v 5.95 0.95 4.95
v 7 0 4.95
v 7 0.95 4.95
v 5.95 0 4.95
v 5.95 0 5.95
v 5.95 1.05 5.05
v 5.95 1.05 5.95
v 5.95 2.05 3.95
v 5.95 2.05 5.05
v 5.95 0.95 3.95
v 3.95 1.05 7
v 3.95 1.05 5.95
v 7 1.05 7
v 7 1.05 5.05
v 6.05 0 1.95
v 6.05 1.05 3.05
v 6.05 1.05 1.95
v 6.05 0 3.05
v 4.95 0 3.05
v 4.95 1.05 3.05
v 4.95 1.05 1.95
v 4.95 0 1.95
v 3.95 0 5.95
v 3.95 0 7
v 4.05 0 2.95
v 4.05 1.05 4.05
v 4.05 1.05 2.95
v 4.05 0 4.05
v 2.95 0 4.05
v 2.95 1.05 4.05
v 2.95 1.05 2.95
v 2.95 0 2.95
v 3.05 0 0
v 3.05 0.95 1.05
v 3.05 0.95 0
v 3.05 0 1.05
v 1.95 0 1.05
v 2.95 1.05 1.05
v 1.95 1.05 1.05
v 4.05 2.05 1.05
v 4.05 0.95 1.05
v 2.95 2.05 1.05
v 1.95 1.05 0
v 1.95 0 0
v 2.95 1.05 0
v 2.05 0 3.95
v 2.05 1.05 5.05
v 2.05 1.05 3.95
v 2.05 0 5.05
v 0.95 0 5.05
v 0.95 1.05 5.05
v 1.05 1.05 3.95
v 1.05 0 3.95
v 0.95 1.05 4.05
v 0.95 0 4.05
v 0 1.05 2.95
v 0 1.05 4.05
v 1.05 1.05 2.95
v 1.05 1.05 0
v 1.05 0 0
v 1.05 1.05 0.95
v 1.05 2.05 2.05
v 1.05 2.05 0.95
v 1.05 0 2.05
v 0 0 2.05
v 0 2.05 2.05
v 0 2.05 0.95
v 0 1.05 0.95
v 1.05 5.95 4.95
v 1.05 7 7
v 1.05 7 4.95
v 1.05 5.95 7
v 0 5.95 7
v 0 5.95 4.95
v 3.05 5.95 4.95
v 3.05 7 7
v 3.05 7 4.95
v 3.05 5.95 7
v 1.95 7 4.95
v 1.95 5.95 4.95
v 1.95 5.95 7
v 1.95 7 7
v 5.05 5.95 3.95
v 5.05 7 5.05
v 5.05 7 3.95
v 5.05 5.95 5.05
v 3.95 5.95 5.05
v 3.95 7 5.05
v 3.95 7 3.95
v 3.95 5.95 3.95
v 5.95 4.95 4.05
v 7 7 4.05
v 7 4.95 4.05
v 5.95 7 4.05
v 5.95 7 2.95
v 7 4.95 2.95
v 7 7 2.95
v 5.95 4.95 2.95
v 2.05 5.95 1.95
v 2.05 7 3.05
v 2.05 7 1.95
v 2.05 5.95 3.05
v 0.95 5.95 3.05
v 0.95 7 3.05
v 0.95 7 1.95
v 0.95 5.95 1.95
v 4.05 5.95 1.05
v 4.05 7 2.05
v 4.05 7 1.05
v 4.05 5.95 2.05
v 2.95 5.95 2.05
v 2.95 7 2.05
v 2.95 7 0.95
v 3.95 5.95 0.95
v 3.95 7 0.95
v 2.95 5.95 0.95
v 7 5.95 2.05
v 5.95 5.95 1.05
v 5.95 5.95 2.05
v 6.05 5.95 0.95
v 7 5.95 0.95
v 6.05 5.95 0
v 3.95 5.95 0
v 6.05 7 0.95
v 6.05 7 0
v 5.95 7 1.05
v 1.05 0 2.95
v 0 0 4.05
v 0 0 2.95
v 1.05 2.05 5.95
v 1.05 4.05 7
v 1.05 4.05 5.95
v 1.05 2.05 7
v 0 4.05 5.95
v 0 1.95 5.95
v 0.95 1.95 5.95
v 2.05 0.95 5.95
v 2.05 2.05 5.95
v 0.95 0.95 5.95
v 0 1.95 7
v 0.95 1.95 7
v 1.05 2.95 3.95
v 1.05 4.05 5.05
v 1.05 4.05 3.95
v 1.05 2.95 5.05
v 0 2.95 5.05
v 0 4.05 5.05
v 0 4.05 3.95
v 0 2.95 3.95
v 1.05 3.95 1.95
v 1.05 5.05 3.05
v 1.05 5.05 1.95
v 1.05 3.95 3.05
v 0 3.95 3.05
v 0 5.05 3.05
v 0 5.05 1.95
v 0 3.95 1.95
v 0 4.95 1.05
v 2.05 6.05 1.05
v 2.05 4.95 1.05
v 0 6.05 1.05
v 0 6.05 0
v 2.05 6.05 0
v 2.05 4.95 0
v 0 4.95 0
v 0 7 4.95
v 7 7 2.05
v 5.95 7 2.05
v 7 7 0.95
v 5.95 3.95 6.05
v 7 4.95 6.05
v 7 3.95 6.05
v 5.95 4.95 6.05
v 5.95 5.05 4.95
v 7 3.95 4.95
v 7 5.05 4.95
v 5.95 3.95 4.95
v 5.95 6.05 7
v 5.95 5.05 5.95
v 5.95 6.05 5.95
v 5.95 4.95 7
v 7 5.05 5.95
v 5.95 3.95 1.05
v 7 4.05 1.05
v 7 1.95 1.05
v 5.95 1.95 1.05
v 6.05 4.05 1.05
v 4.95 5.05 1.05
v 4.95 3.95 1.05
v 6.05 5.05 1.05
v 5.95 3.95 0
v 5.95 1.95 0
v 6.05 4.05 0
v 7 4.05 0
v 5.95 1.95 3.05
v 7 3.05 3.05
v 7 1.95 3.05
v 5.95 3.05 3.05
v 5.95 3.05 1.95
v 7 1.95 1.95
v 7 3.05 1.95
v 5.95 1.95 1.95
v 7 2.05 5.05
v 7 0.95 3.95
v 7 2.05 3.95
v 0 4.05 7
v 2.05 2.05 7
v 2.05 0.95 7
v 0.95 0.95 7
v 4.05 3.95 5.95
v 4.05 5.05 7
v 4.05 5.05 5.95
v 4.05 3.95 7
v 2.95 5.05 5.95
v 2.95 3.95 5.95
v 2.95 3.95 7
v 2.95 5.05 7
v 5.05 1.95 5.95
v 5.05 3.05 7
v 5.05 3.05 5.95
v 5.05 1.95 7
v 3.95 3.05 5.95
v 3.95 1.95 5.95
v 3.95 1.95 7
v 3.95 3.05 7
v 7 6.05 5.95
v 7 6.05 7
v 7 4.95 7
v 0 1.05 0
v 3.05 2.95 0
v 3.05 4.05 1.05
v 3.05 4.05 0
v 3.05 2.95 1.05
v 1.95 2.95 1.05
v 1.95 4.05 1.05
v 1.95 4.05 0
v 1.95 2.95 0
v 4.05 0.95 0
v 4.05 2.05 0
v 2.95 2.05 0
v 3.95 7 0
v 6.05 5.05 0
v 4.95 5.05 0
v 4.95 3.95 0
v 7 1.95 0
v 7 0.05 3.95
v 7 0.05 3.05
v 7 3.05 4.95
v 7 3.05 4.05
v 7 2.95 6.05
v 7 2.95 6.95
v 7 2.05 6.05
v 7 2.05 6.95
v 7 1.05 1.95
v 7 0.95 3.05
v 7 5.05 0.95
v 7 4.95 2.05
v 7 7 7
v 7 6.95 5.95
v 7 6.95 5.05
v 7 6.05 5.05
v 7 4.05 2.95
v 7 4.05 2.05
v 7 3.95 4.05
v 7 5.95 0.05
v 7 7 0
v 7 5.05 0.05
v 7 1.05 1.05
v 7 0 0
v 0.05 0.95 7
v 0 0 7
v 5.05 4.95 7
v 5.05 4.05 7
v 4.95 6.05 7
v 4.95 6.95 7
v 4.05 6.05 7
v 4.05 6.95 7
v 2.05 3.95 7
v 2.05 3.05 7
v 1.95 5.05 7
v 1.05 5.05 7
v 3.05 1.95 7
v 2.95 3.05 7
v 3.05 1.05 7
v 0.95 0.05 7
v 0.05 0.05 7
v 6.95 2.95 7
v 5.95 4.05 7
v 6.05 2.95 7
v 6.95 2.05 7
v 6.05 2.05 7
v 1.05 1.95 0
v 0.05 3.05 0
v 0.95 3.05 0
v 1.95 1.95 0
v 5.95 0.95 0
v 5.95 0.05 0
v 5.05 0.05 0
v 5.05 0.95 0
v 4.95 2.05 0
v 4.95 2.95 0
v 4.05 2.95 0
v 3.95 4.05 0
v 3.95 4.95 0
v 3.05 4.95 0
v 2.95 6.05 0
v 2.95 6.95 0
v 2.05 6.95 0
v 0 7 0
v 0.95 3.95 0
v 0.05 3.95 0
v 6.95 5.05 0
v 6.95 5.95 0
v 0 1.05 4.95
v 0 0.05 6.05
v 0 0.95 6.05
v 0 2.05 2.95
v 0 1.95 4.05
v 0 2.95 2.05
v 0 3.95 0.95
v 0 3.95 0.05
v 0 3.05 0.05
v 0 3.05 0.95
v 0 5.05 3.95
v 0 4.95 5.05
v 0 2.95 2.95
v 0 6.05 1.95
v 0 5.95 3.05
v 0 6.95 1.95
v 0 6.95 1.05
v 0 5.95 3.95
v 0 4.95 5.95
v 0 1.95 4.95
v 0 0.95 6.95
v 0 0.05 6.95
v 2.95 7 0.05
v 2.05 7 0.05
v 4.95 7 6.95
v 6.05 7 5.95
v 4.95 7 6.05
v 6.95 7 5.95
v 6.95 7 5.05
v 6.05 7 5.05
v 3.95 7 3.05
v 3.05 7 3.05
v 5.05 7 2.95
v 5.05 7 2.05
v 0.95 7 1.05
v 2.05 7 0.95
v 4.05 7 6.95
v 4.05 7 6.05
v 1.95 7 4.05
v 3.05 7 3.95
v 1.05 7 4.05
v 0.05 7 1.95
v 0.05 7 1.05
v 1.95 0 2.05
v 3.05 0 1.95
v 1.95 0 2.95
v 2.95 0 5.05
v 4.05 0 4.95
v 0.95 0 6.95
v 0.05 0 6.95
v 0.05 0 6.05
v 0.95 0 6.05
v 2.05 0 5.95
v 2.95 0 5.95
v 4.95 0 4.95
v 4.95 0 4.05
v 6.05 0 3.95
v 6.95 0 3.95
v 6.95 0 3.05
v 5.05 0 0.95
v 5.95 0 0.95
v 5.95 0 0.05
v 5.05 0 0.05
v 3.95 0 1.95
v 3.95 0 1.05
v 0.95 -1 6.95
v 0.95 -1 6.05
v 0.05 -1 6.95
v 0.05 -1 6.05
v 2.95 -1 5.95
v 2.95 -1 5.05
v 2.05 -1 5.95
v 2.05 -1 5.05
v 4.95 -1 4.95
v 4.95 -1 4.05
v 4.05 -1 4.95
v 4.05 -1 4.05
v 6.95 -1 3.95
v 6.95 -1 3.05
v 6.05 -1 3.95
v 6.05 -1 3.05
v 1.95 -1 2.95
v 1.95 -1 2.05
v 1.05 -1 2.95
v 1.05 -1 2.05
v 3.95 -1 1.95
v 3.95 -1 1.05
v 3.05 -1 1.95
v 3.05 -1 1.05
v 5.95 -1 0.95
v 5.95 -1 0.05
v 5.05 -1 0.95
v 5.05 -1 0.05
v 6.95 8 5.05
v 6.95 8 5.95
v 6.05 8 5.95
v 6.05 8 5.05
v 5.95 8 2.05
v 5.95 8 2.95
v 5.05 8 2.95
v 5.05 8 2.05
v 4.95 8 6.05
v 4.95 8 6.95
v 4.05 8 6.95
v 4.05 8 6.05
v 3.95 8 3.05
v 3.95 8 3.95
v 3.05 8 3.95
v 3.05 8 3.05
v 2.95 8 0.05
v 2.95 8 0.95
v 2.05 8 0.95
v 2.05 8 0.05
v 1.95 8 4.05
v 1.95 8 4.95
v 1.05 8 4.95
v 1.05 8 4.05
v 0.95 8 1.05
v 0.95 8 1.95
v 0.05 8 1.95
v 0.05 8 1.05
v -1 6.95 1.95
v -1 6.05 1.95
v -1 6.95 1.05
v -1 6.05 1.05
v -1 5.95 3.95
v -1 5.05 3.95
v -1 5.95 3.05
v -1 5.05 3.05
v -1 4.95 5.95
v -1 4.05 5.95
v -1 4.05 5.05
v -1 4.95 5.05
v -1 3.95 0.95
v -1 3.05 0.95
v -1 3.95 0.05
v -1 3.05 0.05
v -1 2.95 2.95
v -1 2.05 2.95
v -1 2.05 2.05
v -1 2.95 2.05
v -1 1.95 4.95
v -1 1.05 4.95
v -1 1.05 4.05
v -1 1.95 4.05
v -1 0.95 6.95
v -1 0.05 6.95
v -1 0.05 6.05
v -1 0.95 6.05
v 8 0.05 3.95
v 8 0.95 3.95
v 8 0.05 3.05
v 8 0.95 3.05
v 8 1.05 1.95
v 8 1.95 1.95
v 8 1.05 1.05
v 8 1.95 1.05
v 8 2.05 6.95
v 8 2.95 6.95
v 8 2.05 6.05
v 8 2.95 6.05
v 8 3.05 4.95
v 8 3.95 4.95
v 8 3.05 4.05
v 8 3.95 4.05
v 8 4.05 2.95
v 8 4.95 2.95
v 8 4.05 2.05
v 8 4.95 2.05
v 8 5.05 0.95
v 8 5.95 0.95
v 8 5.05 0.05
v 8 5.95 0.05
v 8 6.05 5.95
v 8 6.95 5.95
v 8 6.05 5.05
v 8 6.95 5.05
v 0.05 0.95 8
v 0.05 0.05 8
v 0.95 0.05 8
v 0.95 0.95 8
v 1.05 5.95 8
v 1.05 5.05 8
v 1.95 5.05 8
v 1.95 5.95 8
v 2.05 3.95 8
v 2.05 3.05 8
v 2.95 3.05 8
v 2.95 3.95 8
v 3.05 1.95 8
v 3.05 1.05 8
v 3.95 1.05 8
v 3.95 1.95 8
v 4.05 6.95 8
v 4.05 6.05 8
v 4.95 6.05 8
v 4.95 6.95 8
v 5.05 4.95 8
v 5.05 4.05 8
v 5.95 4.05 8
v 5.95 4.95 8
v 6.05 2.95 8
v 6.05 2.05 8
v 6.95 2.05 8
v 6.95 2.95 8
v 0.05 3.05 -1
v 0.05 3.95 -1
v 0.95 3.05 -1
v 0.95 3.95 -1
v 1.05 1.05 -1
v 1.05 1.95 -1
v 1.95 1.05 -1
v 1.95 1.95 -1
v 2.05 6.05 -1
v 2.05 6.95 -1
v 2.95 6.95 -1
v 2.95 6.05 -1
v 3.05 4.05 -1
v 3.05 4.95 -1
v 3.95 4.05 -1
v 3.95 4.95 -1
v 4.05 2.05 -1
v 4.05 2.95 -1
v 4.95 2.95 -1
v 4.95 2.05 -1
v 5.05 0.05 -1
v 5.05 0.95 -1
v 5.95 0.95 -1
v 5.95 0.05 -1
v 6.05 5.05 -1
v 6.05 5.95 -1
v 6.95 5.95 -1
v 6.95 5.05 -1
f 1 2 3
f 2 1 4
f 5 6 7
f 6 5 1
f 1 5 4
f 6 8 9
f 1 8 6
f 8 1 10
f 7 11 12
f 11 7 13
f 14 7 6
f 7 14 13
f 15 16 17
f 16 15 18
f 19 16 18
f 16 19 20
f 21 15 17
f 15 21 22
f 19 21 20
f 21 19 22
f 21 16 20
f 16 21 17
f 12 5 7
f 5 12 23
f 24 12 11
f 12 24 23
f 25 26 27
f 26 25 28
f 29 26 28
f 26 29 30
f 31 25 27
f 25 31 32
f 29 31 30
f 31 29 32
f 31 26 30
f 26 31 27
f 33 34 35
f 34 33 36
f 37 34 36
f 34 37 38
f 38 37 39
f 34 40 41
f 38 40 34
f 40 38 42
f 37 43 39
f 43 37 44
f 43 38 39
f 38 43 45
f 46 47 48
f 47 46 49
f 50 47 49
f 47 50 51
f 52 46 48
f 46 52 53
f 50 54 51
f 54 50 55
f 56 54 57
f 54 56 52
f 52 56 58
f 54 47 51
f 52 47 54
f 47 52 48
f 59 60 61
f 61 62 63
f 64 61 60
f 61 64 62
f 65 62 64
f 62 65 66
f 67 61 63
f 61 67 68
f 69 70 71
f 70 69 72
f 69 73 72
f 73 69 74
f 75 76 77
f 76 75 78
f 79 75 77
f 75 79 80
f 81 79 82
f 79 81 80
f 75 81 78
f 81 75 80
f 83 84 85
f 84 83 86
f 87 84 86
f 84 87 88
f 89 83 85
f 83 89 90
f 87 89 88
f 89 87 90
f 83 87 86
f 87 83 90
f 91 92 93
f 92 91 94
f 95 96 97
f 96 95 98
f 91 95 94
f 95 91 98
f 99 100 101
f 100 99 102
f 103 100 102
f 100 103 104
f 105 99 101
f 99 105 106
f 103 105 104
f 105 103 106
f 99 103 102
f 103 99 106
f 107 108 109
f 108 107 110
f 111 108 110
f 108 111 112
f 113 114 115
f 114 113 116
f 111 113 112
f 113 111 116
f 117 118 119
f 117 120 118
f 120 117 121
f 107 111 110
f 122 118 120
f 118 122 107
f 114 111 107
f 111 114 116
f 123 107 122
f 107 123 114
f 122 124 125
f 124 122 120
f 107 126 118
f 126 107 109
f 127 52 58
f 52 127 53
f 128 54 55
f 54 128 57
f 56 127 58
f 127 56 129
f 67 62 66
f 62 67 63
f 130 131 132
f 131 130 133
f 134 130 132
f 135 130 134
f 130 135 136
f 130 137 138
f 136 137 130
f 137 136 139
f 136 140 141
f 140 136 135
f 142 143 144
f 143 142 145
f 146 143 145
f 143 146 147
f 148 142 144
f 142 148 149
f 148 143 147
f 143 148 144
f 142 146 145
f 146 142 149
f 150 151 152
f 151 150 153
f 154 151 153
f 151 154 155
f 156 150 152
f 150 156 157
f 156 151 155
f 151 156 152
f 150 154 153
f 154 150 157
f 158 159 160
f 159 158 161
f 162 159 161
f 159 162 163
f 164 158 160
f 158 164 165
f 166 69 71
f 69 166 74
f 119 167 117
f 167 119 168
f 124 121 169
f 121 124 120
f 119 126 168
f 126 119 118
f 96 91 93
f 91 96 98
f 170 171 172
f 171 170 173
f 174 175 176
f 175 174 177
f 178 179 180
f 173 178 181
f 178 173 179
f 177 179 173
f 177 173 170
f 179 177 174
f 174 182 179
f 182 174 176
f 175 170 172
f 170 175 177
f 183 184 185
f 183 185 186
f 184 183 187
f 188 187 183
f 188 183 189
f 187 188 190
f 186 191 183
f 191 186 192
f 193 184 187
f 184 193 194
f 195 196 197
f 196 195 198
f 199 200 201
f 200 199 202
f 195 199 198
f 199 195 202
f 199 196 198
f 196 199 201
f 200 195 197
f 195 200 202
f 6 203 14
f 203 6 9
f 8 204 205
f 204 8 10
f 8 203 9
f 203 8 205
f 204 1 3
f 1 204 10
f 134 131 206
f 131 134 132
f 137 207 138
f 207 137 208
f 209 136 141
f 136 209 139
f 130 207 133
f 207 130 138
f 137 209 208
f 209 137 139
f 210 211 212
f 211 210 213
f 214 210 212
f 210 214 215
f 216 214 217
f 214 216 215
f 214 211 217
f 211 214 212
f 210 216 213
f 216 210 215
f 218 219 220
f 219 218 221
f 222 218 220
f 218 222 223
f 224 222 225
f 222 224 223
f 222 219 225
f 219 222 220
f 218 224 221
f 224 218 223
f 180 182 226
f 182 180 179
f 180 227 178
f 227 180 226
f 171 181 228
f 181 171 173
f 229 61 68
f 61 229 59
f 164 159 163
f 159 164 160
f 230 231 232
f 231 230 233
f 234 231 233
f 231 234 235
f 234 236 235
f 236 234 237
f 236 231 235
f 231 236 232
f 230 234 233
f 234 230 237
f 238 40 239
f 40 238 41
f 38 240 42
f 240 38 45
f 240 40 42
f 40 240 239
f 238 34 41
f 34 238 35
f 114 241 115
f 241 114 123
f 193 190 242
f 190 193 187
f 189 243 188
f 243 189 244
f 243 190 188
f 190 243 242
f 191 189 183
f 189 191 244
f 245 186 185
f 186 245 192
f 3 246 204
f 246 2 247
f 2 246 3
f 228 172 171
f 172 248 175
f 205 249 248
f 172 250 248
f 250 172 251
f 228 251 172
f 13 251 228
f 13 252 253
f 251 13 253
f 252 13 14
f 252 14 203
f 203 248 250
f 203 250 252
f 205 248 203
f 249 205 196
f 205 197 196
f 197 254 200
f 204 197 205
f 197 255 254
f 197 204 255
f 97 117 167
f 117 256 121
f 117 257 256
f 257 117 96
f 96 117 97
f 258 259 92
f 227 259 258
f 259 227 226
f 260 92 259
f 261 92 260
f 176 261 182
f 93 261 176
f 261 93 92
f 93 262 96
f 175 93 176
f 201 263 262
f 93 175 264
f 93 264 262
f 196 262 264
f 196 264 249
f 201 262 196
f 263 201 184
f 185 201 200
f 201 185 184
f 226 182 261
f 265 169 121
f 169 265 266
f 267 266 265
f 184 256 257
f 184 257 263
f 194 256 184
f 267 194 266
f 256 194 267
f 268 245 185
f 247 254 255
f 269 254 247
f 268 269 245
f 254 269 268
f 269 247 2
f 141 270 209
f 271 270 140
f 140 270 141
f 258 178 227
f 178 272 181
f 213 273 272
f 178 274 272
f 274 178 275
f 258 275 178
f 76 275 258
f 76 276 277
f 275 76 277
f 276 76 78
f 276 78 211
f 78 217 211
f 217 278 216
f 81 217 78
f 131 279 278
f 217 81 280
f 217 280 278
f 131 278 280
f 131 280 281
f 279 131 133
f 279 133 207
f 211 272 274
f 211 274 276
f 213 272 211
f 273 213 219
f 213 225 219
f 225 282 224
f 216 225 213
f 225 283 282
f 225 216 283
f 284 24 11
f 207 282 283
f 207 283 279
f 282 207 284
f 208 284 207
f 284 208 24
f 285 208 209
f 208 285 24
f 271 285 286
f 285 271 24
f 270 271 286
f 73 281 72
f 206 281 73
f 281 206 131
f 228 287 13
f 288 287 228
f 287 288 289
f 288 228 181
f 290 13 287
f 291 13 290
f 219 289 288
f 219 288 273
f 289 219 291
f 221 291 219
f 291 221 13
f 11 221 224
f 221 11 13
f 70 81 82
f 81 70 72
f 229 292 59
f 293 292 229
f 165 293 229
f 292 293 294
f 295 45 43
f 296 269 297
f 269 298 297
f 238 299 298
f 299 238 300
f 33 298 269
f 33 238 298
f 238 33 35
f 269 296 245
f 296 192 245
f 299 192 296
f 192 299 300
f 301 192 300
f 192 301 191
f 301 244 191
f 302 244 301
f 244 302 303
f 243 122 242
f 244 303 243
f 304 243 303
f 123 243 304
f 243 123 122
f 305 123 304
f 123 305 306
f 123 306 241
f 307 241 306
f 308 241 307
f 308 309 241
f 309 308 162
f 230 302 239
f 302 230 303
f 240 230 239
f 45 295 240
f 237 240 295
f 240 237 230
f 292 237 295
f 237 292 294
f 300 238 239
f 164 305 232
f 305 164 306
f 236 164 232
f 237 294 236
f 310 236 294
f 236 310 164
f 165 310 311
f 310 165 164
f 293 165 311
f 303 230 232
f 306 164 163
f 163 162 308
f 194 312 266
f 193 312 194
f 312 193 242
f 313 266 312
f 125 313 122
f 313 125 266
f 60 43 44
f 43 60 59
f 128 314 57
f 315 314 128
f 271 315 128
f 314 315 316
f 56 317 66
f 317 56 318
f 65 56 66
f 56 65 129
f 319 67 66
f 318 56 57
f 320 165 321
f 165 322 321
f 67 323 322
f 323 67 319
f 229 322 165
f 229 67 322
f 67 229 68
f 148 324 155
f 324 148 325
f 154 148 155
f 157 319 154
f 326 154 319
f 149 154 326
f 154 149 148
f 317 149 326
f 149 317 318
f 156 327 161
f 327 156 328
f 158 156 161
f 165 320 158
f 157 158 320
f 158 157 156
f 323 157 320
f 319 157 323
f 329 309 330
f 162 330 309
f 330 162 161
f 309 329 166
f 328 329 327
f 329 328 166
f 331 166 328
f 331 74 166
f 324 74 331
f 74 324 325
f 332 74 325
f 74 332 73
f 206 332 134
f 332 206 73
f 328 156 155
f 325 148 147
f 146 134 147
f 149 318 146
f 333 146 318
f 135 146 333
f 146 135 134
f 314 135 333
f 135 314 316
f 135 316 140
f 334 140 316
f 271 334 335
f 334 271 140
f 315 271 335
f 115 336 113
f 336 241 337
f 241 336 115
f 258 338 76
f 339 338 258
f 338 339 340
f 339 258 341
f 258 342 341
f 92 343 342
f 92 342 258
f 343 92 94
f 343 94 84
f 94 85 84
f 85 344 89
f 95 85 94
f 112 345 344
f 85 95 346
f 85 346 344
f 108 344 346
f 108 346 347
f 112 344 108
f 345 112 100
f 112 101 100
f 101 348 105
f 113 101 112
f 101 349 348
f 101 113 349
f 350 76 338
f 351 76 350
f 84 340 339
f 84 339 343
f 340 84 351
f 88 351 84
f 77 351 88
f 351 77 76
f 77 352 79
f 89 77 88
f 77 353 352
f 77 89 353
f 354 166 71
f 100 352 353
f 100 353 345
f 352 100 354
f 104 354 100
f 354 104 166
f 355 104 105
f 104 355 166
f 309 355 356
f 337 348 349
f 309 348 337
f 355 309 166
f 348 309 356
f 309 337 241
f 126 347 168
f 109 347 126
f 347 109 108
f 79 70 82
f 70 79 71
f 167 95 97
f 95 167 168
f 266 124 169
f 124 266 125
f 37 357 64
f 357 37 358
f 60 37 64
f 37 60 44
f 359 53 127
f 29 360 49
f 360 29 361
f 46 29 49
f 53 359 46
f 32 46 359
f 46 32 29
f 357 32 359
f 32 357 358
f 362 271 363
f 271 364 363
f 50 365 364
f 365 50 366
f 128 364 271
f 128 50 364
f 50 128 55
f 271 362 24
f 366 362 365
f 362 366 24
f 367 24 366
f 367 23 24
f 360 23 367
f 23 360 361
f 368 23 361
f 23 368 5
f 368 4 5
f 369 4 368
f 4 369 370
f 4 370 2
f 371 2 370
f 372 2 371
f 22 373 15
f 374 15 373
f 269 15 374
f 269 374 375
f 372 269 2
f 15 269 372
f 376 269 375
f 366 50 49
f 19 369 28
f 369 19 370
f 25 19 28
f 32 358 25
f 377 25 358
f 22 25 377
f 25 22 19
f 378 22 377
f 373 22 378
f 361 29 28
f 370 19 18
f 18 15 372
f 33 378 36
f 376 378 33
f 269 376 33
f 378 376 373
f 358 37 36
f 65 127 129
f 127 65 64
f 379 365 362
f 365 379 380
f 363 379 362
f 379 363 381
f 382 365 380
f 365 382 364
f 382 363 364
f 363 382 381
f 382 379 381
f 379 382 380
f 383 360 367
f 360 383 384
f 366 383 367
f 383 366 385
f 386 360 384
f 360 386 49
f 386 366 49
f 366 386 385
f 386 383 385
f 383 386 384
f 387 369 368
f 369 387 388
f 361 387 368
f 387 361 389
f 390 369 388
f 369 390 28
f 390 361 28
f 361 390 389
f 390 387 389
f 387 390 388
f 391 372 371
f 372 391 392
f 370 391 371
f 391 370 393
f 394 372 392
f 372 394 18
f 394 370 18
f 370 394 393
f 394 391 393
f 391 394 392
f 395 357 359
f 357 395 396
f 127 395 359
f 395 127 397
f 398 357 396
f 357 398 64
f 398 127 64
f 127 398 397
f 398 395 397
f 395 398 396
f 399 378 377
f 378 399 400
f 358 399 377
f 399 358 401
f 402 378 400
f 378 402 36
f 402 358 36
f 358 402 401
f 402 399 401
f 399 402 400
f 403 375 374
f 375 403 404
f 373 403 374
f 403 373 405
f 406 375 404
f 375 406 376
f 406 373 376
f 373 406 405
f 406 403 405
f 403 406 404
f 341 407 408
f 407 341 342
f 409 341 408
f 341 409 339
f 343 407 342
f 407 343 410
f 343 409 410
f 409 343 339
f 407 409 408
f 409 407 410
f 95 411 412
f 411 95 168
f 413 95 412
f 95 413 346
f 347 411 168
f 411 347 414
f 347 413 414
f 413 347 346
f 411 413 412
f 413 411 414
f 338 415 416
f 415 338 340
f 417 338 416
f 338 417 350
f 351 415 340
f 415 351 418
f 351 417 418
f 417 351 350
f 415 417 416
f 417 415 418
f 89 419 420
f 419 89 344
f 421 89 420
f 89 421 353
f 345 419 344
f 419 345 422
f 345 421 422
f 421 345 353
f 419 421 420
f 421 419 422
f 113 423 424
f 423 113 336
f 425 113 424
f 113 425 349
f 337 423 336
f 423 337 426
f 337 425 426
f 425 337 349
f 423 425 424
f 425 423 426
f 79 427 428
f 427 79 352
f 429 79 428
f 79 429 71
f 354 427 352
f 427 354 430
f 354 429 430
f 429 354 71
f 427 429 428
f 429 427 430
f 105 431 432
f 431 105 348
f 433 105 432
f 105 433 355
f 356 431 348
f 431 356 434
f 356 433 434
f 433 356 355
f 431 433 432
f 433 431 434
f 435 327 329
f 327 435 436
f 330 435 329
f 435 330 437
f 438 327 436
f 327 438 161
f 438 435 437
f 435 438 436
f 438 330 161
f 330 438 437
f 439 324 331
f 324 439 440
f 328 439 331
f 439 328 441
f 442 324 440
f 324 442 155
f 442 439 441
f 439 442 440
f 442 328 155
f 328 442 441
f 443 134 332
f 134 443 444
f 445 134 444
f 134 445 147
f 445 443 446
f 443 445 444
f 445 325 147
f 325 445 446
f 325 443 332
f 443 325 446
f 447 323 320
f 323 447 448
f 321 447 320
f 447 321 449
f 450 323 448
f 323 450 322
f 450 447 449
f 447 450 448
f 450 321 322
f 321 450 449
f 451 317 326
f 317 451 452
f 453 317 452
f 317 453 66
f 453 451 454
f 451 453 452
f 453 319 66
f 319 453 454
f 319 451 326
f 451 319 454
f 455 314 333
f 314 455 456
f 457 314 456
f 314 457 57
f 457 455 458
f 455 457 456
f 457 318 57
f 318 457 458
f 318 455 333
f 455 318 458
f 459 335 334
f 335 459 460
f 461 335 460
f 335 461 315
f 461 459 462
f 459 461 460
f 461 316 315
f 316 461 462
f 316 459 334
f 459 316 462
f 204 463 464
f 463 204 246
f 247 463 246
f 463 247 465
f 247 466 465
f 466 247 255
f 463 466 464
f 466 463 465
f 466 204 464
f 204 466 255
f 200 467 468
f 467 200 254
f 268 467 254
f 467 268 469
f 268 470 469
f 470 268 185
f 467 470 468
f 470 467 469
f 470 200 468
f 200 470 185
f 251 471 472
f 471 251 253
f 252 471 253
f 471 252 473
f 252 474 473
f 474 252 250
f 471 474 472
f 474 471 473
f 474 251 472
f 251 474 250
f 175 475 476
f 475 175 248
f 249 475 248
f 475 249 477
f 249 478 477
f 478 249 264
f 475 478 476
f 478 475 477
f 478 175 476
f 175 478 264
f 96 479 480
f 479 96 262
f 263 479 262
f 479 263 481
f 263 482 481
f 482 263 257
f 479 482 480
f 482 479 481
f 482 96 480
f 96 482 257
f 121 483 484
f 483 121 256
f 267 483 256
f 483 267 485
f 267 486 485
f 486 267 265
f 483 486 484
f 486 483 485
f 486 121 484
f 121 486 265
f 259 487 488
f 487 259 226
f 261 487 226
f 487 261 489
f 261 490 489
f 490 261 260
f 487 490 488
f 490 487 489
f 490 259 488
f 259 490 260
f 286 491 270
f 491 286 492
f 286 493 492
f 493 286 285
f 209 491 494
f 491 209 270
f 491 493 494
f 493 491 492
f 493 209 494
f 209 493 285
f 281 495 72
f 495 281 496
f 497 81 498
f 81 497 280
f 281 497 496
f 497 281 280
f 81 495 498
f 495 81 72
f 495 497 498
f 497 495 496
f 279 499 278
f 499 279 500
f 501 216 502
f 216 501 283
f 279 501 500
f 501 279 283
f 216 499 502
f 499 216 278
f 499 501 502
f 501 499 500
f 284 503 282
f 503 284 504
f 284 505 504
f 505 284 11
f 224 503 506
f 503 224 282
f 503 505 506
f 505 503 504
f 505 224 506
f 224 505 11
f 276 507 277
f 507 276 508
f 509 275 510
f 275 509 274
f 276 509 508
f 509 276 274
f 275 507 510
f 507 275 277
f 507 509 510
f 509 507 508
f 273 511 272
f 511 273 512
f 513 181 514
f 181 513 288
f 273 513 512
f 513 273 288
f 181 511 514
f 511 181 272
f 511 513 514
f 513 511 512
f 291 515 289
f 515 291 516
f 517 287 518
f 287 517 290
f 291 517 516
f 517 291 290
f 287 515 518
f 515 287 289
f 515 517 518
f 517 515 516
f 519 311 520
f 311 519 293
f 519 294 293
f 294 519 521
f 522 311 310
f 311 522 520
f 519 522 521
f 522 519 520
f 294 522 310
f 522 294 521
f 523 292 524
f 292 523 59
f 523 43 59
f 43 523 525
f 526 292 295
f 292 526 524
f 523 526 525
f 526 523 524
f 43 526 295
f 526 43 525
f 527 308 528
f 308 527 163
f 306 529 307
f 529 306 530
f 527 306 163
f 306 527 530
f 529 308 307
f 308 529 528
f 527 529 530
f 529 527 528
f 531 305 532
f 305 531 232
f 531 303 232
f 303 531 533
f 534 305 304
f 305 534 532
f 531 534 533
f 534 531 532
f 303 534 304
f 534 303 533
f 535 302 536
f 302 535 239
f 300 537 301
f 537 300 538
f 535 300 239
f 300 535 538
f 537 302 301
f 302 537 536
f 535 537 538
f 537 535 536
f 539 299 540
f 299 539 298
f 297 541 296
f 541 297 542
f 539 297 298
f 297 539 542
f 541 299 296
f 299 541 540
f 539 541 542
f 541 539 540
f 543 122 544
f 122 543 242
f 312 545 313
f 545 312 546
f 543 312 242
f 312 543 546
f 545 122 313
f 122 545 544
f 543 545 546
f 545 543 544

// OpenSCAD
smallCube = 1;
bigCube = 7 * smallCube;
toothPadding = 0.9; // making teeth smaller by a factor
holePadding = 1.1; // making holes larger by a factor

module hole() {
  h = holePadding * smallCube;
  d = (smallCube - h) / 2;

  translate([d, d, d])
  cube([h, h, h]);
}

module yTooth() {
  t = toothPadding * smallCube;
  d = (smallCube - t) / 2;

  translate([d, 0, d])
  cube([t, smallCube, t]);
}

module xTooth() {
  translate([1, 0, 0]) rotate([0, 0, 90]) yTooth();
}

module zTooth() {
  translate([0, 1, 0]) rotate([90, 0, 0]) yTooth();
}

module plusCube(front = false, back = false, left = false, right = false, top = false, bottom = false) {
  // translate([-bigCube/2, -bigCube/2, -bigCube/2])
  
  union() {
    difference() {
      cube([bigCube, bigCube, bigCube]);

      if (front) {
        translate([6, 0, 5]) hole();
        translate([5, 0, 2]) hole();
        translate([4, 0, 6]) hole();
        translate([3, 0, 3]) hole();
        translate([2, 0, 0]) hole();
        translate([1, 0, 4]) hole();
        translate([0, 0, 1]) hole();
      }

      if (back) {
        translate([0, 6, 6]) hole();
        translate([2, 6, 5]) hole();
        translate([4, 6, 4]) hole();
        translate([6, 6, 3]) hole();
        translate([1, 6, 2]) hole();
        translate([3, 6, 1]) hole();
        translate([5, 6, 0]) hole();
      }

      if (left) {
        translate([0, 0, 3]) hole();
        translate([0, 1, 1]) hole();
        translate([0, 2, 6]) hole();
        translate([0, 3, 4]) hole();
        translate([0, 4, 2]) hole();
        translate([0, 5, 0]) hole();
        translate([0, 6, 5]) hole();
      }

      if (right) {
        translate([6, 6, 1]) hole();
        translate([6, 5, 3]) hole();
        translate([6, 4, 5]) hole();
        translate([6, 3, 0]) hole();
        translate([6, 2, 2]) hole();
        translate([6, 1, 4]) hole();
        translate([6, 0, 6]) hole();
      }

      if (top) {
        translate([0, 3, 6]) hole();
        translate([1, 1, 6]) hole();
        translate([2, 6, 6]) hole();
        translate([3, 4, 6]) hole();
        translate([4, 2, 6]) hole();
        translate([5, 0, 6]) hole();
        translate([6, 5, 6]) hole();
      }

      if (bottom) {
        translate([0, 0, 0]) hole();
        translate([1, 5, 0]) hole();
        translate([2, 3, 0]) hole();
        translate([3, 1, 0]) hole();
        translate([4, 6, 0]) hole();
        translate([5, 4, 0]) hole();
        translate([6, 2, 0]) hole();
      }
    }

    if( front){
      translate([0, -1, 6]) yTooth();
      translate([2, -1, 5]) yTooth();
      translate([4, -1, 4]) yTooth();
      translate([6, -1, 3]) yTooth();
      translate([1, -1, 2]) yTooth();
      translate([3, -1, 1]) yTooth();
      translate([5, -1, 0]) yTooth();
    }

    if( back){
      translate([6, 7, 5]) yTooth();
      translate([5, 7, 2]) yTooth();
      translate([4, 7, 6]) yTooth();
      translate([3, 7, 3]) yTooth();
      translate([2, 7, 0]) yTooth();
      translate([1, 7, 4]) yTooth();
      translate([0, 7, 1]) yTooth();
    }

    if( left){
      translate([-1, 6, 1]) xTooth();
      translate([-1, 5, 3]) xTooth();
      translate([-1, 4, 5]) xTooth();
      translate([-1, 3, 0]) xTooth();
      translate([-1, 2, 2]) xTooth();
      translate([-1, 1, 4]) xTooth();
      translate([-1, 0, 6]) xTooth();
    }

    if( right){
      translate([7, 0, 3]) xTooth();
      translate([7, 1, 1]) xTooth();
      translate([7, 2, 6]) xTooth();
      translate([7, 3, 4]) xTooth();
      translate([7, 4, 2]) xTooth();
      translate([7, 5, 0]) xTooth();
      translate([7, 6, 5]) xTooth();
    }

    if( top){
      translate([0, 0, 7]) zTooth();
      translate([1, 5, 7]) zTooth();
      translate([2, 3, 7]) zTooth();
      translate([3, 1, 7]) zTooth();
      translate([4, 6, 7]) zTooth();
      translate([5, 4, 7]) zTooth();
      translate([6, 2, 7]) zTooth();
    }

    if( bottom){
      translate([0, 3, -1]) zTooth();
      translate([1, 1, -1]) zTooth();
      translate([2, 6, -1]) zTooth();
      translate([3, 4, -1]) zTooth();
      translate([4, 2, -1]) zTooth();
      translate([5, 0, -1]) zTooth();
      translate([6, 5, -1]) zTooth();
    }
  }
}

module demo() {
  plusCube(front=true, back=true, left=true, right=true, top=true, bottom=true);
}

module main() {
  shift = 2 * bigCube;

  for (z = [0:2]) {
    for (y = [0:2]) {
      for (x = [0:2]) {
        front = (y != 0);
        back = (y != 2);
        left = (x != 0);
        right = (x != 2);
        bottom = (z != 0);
        top = (z != 2);

        translate([x * shift, y * shift, z * shift]) plusCube(front, back, left, right, top, bottom);
      }
    }
  }
}

demo();
// Bmain();
